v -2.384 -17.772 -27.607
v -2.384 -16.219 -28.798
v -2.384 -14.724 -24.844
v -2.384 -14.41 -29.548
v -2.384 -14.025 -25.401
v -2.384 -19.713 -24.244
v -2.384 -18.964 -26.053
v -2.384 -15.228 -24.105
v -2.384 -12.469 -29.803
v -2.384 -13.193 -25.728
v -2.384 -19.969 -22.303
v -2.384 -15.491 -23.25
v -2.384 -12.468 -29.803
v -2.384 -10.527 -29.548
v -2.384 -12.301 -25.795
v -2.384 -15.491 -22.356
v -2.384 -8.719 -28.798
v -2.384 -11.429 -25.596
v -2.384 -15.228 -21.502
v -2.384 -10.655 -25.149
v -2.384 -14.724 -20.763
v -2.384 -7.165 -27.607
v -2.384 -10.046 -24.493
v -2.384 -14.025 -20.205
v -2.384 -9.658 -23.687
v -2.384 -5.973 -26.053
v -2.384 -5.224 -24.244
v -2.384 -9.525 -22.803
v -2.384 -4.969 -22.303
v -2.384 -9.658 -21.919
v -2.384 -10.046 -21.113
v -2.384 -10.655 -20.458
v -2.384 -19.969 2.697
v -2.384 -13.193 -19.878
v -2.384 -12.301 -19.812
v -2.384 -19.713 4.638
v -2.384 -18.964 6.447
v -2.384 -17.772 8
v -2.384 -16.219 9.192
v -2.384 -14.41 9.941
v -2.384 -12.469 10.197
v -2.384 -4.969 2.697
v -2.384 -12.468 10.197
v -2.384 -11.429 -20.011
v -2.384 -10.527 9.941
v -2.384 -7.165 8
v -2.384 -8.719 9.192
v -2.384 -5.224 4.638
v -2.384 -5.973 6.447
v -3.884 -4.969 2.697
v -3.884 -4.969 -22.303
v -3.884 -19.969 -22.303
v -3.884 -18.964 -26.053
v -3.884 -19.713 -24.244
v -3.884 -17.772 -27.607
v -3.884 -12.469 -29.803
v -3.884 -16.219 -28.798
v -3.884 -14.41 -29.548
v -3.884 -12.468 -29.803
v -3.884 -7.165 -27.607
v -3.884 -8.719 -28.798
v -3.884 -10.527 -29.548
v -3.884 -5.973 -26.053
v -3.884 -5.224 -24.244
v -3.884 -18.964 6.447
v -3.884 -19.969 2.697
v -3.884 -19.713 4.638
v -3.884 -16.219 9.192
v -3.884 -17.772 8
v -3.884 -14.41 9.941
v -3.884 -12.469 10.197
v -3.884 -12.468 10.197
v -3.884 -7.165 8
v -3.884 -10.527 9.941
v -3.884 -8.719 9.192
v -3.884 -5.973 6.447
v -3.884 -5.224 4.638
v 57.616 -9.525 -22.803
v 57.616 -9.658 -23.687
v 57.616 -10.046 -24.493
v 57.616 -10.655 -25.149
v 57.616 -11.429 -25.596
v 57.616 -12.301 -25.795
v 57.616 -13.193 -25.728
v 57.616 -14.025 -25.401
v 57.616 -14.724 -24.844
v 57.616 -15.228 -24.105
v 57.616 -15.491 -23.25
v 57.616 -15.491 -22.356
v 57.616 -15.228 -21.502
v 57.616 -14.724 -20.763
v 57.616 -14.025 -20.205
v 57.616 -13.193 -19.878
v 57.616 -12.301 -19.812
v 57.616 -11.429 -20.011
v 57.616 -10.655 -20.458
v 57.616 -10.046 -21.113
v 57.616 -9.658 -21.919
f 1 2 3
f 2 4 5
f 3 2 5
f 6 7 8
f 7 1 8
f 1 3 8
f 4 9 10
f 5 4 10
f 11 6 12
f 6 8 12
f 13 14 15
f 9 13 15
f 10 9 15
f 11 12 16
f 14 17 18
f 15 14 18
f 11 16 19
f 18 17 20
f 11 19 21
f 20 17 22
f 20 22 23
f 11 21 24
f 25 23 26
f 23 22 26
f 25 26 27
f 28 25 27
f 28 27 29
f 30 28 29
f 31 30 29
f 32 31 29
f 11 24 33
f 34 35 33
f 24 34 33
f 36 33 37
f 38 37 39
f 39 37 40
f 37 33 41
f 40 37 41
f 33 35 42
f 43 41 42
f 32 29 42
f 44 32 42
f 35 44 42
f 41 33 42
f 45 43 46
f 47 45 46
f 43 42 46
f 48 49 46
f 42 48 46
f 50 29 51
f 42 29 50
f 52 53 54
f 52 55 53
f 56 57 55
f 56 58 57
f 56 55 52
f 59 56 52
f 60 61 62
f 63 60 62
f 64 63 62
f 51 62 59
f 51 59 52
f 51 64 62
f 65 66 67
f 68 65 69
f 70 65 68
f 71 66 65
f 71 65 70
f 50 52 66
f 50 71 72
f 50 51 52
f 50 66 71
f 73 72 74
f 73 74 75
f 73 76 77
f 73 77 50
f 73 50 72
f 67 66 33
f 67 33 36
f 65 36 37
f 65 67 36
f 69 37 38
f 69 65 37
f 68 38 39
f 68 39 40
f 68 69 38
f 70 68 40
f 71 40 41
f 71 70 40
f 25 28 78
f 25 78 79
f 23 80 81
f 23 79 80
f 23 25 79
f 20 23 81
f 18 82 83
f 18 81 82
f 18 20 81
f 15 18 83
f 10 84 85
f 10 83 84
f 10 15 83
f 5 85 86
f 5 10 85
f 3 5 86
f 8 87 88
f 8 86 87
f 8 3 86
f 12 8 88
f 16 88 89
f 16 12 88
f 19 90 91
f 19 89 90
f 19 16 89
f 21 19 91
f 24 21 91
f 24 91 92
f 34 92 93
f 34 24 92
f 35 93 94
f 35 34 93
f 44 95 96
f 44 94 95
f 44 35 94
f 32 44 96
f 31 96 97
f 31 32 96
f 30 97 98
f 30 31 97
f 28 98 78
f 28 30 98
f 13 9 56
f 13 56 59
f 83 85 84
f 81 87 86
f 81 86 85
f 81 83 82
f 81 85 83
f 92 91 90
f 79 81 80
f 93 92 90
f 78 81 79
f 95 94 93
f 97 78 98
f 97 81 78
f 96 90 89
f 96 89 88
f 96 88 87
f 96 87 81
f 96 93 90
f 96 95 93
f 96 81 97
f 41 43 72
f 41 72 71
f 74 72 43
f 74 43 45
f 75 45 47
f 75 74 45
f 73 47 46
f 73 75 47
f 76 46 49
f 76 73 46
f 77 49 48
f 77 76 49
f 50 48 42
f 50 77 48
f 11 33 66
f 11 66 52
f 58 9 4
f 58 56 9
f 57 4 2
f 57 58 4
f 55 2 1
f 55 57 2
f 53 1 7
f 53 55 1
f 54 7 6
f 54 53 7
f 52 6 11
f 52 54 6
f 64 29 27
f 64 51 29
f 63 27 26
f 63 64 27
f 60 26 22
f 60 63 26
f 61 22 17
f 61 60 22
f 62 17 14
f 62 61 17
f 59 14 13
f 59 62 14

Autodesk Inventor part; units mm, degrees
ref_plane "YZ Plane" through (0, 0, 0) normal (1, 0, 0) x (0, 1, 0)
ref_plane "XZ Plane" through (0, 0, 0) normal (0, 1, 0) x (-1, 0, 0)
ref_plane "XY Plane" through (0, 0, 0) normal (0, 0, 1) x (1, 0, 0)
ref_plane "Płaszczyzna konstrukcyjna1" through (-2.3844, -12.525, -22.8032) normal (1, 0, 0) x (0, 1, 0)
sketch "Szkic1" plane through (-2.3844, -12.525, -22.8032) normal (1, 0, 0) x (0, 1, 0)
  circle A0 centre (0, 0) radius 3
  point P0 (12.525, 22.8032)
  dimension "d0" = 6
extrude "Wyciągnięcie proste1" add sketch "Szkic1" along normal blind 60
sketch "Szkic2" plane through (-2.3844, -12.525, -22.8032) normal (-1, 0, 0) x (0, 0, 1)
  line L0 (33, -7.4436) -> (-7, -7.4436)
  line L1 (-7, -7.4436) -> (-7, 7.5564)
  line L2 (-7, 7.5564) -> (33, 7.5564)
  line L3 (33, 7.5564) -> (33, -7.4436)
  line L4 (33, -7.4436) -> (-7, 7.5564) construction
  line L5 (-7, -7.4436) -> (33, 7.5564) construction
  line L6 (0, 16.5188) -> (0, -11.4374)
  circle A0 centre (0, 0) radius 3 projected
  point P0 (22.8032, 12.525)
  point P1 (13, 0.0564)
  dimension "d3" = 40
  dimension "d4" = 15
  dimension "d5" = 7
extrude "Wyciągnięcie proste2" add sketch "Szkic2" along normal blind 1.5
full round fillet "Zaokrąglenie1" first side at (-2.8844, -19.9687, -16.4698) centre faces at (-2.8844, -9.9687, -29.8032) second side at (-2.8844, -4.9687, -3.1365)
full round fillet "Zaokrąglenie2" first side at (-2.8844, -19.9687, -11.4699) centre faces at (-2.8844, -14.9687, 10.1968) second side at (-2.8844, -4.9687, -0.6365)
properties part number "uchwyt1" material "Aluminium 3004-O"
